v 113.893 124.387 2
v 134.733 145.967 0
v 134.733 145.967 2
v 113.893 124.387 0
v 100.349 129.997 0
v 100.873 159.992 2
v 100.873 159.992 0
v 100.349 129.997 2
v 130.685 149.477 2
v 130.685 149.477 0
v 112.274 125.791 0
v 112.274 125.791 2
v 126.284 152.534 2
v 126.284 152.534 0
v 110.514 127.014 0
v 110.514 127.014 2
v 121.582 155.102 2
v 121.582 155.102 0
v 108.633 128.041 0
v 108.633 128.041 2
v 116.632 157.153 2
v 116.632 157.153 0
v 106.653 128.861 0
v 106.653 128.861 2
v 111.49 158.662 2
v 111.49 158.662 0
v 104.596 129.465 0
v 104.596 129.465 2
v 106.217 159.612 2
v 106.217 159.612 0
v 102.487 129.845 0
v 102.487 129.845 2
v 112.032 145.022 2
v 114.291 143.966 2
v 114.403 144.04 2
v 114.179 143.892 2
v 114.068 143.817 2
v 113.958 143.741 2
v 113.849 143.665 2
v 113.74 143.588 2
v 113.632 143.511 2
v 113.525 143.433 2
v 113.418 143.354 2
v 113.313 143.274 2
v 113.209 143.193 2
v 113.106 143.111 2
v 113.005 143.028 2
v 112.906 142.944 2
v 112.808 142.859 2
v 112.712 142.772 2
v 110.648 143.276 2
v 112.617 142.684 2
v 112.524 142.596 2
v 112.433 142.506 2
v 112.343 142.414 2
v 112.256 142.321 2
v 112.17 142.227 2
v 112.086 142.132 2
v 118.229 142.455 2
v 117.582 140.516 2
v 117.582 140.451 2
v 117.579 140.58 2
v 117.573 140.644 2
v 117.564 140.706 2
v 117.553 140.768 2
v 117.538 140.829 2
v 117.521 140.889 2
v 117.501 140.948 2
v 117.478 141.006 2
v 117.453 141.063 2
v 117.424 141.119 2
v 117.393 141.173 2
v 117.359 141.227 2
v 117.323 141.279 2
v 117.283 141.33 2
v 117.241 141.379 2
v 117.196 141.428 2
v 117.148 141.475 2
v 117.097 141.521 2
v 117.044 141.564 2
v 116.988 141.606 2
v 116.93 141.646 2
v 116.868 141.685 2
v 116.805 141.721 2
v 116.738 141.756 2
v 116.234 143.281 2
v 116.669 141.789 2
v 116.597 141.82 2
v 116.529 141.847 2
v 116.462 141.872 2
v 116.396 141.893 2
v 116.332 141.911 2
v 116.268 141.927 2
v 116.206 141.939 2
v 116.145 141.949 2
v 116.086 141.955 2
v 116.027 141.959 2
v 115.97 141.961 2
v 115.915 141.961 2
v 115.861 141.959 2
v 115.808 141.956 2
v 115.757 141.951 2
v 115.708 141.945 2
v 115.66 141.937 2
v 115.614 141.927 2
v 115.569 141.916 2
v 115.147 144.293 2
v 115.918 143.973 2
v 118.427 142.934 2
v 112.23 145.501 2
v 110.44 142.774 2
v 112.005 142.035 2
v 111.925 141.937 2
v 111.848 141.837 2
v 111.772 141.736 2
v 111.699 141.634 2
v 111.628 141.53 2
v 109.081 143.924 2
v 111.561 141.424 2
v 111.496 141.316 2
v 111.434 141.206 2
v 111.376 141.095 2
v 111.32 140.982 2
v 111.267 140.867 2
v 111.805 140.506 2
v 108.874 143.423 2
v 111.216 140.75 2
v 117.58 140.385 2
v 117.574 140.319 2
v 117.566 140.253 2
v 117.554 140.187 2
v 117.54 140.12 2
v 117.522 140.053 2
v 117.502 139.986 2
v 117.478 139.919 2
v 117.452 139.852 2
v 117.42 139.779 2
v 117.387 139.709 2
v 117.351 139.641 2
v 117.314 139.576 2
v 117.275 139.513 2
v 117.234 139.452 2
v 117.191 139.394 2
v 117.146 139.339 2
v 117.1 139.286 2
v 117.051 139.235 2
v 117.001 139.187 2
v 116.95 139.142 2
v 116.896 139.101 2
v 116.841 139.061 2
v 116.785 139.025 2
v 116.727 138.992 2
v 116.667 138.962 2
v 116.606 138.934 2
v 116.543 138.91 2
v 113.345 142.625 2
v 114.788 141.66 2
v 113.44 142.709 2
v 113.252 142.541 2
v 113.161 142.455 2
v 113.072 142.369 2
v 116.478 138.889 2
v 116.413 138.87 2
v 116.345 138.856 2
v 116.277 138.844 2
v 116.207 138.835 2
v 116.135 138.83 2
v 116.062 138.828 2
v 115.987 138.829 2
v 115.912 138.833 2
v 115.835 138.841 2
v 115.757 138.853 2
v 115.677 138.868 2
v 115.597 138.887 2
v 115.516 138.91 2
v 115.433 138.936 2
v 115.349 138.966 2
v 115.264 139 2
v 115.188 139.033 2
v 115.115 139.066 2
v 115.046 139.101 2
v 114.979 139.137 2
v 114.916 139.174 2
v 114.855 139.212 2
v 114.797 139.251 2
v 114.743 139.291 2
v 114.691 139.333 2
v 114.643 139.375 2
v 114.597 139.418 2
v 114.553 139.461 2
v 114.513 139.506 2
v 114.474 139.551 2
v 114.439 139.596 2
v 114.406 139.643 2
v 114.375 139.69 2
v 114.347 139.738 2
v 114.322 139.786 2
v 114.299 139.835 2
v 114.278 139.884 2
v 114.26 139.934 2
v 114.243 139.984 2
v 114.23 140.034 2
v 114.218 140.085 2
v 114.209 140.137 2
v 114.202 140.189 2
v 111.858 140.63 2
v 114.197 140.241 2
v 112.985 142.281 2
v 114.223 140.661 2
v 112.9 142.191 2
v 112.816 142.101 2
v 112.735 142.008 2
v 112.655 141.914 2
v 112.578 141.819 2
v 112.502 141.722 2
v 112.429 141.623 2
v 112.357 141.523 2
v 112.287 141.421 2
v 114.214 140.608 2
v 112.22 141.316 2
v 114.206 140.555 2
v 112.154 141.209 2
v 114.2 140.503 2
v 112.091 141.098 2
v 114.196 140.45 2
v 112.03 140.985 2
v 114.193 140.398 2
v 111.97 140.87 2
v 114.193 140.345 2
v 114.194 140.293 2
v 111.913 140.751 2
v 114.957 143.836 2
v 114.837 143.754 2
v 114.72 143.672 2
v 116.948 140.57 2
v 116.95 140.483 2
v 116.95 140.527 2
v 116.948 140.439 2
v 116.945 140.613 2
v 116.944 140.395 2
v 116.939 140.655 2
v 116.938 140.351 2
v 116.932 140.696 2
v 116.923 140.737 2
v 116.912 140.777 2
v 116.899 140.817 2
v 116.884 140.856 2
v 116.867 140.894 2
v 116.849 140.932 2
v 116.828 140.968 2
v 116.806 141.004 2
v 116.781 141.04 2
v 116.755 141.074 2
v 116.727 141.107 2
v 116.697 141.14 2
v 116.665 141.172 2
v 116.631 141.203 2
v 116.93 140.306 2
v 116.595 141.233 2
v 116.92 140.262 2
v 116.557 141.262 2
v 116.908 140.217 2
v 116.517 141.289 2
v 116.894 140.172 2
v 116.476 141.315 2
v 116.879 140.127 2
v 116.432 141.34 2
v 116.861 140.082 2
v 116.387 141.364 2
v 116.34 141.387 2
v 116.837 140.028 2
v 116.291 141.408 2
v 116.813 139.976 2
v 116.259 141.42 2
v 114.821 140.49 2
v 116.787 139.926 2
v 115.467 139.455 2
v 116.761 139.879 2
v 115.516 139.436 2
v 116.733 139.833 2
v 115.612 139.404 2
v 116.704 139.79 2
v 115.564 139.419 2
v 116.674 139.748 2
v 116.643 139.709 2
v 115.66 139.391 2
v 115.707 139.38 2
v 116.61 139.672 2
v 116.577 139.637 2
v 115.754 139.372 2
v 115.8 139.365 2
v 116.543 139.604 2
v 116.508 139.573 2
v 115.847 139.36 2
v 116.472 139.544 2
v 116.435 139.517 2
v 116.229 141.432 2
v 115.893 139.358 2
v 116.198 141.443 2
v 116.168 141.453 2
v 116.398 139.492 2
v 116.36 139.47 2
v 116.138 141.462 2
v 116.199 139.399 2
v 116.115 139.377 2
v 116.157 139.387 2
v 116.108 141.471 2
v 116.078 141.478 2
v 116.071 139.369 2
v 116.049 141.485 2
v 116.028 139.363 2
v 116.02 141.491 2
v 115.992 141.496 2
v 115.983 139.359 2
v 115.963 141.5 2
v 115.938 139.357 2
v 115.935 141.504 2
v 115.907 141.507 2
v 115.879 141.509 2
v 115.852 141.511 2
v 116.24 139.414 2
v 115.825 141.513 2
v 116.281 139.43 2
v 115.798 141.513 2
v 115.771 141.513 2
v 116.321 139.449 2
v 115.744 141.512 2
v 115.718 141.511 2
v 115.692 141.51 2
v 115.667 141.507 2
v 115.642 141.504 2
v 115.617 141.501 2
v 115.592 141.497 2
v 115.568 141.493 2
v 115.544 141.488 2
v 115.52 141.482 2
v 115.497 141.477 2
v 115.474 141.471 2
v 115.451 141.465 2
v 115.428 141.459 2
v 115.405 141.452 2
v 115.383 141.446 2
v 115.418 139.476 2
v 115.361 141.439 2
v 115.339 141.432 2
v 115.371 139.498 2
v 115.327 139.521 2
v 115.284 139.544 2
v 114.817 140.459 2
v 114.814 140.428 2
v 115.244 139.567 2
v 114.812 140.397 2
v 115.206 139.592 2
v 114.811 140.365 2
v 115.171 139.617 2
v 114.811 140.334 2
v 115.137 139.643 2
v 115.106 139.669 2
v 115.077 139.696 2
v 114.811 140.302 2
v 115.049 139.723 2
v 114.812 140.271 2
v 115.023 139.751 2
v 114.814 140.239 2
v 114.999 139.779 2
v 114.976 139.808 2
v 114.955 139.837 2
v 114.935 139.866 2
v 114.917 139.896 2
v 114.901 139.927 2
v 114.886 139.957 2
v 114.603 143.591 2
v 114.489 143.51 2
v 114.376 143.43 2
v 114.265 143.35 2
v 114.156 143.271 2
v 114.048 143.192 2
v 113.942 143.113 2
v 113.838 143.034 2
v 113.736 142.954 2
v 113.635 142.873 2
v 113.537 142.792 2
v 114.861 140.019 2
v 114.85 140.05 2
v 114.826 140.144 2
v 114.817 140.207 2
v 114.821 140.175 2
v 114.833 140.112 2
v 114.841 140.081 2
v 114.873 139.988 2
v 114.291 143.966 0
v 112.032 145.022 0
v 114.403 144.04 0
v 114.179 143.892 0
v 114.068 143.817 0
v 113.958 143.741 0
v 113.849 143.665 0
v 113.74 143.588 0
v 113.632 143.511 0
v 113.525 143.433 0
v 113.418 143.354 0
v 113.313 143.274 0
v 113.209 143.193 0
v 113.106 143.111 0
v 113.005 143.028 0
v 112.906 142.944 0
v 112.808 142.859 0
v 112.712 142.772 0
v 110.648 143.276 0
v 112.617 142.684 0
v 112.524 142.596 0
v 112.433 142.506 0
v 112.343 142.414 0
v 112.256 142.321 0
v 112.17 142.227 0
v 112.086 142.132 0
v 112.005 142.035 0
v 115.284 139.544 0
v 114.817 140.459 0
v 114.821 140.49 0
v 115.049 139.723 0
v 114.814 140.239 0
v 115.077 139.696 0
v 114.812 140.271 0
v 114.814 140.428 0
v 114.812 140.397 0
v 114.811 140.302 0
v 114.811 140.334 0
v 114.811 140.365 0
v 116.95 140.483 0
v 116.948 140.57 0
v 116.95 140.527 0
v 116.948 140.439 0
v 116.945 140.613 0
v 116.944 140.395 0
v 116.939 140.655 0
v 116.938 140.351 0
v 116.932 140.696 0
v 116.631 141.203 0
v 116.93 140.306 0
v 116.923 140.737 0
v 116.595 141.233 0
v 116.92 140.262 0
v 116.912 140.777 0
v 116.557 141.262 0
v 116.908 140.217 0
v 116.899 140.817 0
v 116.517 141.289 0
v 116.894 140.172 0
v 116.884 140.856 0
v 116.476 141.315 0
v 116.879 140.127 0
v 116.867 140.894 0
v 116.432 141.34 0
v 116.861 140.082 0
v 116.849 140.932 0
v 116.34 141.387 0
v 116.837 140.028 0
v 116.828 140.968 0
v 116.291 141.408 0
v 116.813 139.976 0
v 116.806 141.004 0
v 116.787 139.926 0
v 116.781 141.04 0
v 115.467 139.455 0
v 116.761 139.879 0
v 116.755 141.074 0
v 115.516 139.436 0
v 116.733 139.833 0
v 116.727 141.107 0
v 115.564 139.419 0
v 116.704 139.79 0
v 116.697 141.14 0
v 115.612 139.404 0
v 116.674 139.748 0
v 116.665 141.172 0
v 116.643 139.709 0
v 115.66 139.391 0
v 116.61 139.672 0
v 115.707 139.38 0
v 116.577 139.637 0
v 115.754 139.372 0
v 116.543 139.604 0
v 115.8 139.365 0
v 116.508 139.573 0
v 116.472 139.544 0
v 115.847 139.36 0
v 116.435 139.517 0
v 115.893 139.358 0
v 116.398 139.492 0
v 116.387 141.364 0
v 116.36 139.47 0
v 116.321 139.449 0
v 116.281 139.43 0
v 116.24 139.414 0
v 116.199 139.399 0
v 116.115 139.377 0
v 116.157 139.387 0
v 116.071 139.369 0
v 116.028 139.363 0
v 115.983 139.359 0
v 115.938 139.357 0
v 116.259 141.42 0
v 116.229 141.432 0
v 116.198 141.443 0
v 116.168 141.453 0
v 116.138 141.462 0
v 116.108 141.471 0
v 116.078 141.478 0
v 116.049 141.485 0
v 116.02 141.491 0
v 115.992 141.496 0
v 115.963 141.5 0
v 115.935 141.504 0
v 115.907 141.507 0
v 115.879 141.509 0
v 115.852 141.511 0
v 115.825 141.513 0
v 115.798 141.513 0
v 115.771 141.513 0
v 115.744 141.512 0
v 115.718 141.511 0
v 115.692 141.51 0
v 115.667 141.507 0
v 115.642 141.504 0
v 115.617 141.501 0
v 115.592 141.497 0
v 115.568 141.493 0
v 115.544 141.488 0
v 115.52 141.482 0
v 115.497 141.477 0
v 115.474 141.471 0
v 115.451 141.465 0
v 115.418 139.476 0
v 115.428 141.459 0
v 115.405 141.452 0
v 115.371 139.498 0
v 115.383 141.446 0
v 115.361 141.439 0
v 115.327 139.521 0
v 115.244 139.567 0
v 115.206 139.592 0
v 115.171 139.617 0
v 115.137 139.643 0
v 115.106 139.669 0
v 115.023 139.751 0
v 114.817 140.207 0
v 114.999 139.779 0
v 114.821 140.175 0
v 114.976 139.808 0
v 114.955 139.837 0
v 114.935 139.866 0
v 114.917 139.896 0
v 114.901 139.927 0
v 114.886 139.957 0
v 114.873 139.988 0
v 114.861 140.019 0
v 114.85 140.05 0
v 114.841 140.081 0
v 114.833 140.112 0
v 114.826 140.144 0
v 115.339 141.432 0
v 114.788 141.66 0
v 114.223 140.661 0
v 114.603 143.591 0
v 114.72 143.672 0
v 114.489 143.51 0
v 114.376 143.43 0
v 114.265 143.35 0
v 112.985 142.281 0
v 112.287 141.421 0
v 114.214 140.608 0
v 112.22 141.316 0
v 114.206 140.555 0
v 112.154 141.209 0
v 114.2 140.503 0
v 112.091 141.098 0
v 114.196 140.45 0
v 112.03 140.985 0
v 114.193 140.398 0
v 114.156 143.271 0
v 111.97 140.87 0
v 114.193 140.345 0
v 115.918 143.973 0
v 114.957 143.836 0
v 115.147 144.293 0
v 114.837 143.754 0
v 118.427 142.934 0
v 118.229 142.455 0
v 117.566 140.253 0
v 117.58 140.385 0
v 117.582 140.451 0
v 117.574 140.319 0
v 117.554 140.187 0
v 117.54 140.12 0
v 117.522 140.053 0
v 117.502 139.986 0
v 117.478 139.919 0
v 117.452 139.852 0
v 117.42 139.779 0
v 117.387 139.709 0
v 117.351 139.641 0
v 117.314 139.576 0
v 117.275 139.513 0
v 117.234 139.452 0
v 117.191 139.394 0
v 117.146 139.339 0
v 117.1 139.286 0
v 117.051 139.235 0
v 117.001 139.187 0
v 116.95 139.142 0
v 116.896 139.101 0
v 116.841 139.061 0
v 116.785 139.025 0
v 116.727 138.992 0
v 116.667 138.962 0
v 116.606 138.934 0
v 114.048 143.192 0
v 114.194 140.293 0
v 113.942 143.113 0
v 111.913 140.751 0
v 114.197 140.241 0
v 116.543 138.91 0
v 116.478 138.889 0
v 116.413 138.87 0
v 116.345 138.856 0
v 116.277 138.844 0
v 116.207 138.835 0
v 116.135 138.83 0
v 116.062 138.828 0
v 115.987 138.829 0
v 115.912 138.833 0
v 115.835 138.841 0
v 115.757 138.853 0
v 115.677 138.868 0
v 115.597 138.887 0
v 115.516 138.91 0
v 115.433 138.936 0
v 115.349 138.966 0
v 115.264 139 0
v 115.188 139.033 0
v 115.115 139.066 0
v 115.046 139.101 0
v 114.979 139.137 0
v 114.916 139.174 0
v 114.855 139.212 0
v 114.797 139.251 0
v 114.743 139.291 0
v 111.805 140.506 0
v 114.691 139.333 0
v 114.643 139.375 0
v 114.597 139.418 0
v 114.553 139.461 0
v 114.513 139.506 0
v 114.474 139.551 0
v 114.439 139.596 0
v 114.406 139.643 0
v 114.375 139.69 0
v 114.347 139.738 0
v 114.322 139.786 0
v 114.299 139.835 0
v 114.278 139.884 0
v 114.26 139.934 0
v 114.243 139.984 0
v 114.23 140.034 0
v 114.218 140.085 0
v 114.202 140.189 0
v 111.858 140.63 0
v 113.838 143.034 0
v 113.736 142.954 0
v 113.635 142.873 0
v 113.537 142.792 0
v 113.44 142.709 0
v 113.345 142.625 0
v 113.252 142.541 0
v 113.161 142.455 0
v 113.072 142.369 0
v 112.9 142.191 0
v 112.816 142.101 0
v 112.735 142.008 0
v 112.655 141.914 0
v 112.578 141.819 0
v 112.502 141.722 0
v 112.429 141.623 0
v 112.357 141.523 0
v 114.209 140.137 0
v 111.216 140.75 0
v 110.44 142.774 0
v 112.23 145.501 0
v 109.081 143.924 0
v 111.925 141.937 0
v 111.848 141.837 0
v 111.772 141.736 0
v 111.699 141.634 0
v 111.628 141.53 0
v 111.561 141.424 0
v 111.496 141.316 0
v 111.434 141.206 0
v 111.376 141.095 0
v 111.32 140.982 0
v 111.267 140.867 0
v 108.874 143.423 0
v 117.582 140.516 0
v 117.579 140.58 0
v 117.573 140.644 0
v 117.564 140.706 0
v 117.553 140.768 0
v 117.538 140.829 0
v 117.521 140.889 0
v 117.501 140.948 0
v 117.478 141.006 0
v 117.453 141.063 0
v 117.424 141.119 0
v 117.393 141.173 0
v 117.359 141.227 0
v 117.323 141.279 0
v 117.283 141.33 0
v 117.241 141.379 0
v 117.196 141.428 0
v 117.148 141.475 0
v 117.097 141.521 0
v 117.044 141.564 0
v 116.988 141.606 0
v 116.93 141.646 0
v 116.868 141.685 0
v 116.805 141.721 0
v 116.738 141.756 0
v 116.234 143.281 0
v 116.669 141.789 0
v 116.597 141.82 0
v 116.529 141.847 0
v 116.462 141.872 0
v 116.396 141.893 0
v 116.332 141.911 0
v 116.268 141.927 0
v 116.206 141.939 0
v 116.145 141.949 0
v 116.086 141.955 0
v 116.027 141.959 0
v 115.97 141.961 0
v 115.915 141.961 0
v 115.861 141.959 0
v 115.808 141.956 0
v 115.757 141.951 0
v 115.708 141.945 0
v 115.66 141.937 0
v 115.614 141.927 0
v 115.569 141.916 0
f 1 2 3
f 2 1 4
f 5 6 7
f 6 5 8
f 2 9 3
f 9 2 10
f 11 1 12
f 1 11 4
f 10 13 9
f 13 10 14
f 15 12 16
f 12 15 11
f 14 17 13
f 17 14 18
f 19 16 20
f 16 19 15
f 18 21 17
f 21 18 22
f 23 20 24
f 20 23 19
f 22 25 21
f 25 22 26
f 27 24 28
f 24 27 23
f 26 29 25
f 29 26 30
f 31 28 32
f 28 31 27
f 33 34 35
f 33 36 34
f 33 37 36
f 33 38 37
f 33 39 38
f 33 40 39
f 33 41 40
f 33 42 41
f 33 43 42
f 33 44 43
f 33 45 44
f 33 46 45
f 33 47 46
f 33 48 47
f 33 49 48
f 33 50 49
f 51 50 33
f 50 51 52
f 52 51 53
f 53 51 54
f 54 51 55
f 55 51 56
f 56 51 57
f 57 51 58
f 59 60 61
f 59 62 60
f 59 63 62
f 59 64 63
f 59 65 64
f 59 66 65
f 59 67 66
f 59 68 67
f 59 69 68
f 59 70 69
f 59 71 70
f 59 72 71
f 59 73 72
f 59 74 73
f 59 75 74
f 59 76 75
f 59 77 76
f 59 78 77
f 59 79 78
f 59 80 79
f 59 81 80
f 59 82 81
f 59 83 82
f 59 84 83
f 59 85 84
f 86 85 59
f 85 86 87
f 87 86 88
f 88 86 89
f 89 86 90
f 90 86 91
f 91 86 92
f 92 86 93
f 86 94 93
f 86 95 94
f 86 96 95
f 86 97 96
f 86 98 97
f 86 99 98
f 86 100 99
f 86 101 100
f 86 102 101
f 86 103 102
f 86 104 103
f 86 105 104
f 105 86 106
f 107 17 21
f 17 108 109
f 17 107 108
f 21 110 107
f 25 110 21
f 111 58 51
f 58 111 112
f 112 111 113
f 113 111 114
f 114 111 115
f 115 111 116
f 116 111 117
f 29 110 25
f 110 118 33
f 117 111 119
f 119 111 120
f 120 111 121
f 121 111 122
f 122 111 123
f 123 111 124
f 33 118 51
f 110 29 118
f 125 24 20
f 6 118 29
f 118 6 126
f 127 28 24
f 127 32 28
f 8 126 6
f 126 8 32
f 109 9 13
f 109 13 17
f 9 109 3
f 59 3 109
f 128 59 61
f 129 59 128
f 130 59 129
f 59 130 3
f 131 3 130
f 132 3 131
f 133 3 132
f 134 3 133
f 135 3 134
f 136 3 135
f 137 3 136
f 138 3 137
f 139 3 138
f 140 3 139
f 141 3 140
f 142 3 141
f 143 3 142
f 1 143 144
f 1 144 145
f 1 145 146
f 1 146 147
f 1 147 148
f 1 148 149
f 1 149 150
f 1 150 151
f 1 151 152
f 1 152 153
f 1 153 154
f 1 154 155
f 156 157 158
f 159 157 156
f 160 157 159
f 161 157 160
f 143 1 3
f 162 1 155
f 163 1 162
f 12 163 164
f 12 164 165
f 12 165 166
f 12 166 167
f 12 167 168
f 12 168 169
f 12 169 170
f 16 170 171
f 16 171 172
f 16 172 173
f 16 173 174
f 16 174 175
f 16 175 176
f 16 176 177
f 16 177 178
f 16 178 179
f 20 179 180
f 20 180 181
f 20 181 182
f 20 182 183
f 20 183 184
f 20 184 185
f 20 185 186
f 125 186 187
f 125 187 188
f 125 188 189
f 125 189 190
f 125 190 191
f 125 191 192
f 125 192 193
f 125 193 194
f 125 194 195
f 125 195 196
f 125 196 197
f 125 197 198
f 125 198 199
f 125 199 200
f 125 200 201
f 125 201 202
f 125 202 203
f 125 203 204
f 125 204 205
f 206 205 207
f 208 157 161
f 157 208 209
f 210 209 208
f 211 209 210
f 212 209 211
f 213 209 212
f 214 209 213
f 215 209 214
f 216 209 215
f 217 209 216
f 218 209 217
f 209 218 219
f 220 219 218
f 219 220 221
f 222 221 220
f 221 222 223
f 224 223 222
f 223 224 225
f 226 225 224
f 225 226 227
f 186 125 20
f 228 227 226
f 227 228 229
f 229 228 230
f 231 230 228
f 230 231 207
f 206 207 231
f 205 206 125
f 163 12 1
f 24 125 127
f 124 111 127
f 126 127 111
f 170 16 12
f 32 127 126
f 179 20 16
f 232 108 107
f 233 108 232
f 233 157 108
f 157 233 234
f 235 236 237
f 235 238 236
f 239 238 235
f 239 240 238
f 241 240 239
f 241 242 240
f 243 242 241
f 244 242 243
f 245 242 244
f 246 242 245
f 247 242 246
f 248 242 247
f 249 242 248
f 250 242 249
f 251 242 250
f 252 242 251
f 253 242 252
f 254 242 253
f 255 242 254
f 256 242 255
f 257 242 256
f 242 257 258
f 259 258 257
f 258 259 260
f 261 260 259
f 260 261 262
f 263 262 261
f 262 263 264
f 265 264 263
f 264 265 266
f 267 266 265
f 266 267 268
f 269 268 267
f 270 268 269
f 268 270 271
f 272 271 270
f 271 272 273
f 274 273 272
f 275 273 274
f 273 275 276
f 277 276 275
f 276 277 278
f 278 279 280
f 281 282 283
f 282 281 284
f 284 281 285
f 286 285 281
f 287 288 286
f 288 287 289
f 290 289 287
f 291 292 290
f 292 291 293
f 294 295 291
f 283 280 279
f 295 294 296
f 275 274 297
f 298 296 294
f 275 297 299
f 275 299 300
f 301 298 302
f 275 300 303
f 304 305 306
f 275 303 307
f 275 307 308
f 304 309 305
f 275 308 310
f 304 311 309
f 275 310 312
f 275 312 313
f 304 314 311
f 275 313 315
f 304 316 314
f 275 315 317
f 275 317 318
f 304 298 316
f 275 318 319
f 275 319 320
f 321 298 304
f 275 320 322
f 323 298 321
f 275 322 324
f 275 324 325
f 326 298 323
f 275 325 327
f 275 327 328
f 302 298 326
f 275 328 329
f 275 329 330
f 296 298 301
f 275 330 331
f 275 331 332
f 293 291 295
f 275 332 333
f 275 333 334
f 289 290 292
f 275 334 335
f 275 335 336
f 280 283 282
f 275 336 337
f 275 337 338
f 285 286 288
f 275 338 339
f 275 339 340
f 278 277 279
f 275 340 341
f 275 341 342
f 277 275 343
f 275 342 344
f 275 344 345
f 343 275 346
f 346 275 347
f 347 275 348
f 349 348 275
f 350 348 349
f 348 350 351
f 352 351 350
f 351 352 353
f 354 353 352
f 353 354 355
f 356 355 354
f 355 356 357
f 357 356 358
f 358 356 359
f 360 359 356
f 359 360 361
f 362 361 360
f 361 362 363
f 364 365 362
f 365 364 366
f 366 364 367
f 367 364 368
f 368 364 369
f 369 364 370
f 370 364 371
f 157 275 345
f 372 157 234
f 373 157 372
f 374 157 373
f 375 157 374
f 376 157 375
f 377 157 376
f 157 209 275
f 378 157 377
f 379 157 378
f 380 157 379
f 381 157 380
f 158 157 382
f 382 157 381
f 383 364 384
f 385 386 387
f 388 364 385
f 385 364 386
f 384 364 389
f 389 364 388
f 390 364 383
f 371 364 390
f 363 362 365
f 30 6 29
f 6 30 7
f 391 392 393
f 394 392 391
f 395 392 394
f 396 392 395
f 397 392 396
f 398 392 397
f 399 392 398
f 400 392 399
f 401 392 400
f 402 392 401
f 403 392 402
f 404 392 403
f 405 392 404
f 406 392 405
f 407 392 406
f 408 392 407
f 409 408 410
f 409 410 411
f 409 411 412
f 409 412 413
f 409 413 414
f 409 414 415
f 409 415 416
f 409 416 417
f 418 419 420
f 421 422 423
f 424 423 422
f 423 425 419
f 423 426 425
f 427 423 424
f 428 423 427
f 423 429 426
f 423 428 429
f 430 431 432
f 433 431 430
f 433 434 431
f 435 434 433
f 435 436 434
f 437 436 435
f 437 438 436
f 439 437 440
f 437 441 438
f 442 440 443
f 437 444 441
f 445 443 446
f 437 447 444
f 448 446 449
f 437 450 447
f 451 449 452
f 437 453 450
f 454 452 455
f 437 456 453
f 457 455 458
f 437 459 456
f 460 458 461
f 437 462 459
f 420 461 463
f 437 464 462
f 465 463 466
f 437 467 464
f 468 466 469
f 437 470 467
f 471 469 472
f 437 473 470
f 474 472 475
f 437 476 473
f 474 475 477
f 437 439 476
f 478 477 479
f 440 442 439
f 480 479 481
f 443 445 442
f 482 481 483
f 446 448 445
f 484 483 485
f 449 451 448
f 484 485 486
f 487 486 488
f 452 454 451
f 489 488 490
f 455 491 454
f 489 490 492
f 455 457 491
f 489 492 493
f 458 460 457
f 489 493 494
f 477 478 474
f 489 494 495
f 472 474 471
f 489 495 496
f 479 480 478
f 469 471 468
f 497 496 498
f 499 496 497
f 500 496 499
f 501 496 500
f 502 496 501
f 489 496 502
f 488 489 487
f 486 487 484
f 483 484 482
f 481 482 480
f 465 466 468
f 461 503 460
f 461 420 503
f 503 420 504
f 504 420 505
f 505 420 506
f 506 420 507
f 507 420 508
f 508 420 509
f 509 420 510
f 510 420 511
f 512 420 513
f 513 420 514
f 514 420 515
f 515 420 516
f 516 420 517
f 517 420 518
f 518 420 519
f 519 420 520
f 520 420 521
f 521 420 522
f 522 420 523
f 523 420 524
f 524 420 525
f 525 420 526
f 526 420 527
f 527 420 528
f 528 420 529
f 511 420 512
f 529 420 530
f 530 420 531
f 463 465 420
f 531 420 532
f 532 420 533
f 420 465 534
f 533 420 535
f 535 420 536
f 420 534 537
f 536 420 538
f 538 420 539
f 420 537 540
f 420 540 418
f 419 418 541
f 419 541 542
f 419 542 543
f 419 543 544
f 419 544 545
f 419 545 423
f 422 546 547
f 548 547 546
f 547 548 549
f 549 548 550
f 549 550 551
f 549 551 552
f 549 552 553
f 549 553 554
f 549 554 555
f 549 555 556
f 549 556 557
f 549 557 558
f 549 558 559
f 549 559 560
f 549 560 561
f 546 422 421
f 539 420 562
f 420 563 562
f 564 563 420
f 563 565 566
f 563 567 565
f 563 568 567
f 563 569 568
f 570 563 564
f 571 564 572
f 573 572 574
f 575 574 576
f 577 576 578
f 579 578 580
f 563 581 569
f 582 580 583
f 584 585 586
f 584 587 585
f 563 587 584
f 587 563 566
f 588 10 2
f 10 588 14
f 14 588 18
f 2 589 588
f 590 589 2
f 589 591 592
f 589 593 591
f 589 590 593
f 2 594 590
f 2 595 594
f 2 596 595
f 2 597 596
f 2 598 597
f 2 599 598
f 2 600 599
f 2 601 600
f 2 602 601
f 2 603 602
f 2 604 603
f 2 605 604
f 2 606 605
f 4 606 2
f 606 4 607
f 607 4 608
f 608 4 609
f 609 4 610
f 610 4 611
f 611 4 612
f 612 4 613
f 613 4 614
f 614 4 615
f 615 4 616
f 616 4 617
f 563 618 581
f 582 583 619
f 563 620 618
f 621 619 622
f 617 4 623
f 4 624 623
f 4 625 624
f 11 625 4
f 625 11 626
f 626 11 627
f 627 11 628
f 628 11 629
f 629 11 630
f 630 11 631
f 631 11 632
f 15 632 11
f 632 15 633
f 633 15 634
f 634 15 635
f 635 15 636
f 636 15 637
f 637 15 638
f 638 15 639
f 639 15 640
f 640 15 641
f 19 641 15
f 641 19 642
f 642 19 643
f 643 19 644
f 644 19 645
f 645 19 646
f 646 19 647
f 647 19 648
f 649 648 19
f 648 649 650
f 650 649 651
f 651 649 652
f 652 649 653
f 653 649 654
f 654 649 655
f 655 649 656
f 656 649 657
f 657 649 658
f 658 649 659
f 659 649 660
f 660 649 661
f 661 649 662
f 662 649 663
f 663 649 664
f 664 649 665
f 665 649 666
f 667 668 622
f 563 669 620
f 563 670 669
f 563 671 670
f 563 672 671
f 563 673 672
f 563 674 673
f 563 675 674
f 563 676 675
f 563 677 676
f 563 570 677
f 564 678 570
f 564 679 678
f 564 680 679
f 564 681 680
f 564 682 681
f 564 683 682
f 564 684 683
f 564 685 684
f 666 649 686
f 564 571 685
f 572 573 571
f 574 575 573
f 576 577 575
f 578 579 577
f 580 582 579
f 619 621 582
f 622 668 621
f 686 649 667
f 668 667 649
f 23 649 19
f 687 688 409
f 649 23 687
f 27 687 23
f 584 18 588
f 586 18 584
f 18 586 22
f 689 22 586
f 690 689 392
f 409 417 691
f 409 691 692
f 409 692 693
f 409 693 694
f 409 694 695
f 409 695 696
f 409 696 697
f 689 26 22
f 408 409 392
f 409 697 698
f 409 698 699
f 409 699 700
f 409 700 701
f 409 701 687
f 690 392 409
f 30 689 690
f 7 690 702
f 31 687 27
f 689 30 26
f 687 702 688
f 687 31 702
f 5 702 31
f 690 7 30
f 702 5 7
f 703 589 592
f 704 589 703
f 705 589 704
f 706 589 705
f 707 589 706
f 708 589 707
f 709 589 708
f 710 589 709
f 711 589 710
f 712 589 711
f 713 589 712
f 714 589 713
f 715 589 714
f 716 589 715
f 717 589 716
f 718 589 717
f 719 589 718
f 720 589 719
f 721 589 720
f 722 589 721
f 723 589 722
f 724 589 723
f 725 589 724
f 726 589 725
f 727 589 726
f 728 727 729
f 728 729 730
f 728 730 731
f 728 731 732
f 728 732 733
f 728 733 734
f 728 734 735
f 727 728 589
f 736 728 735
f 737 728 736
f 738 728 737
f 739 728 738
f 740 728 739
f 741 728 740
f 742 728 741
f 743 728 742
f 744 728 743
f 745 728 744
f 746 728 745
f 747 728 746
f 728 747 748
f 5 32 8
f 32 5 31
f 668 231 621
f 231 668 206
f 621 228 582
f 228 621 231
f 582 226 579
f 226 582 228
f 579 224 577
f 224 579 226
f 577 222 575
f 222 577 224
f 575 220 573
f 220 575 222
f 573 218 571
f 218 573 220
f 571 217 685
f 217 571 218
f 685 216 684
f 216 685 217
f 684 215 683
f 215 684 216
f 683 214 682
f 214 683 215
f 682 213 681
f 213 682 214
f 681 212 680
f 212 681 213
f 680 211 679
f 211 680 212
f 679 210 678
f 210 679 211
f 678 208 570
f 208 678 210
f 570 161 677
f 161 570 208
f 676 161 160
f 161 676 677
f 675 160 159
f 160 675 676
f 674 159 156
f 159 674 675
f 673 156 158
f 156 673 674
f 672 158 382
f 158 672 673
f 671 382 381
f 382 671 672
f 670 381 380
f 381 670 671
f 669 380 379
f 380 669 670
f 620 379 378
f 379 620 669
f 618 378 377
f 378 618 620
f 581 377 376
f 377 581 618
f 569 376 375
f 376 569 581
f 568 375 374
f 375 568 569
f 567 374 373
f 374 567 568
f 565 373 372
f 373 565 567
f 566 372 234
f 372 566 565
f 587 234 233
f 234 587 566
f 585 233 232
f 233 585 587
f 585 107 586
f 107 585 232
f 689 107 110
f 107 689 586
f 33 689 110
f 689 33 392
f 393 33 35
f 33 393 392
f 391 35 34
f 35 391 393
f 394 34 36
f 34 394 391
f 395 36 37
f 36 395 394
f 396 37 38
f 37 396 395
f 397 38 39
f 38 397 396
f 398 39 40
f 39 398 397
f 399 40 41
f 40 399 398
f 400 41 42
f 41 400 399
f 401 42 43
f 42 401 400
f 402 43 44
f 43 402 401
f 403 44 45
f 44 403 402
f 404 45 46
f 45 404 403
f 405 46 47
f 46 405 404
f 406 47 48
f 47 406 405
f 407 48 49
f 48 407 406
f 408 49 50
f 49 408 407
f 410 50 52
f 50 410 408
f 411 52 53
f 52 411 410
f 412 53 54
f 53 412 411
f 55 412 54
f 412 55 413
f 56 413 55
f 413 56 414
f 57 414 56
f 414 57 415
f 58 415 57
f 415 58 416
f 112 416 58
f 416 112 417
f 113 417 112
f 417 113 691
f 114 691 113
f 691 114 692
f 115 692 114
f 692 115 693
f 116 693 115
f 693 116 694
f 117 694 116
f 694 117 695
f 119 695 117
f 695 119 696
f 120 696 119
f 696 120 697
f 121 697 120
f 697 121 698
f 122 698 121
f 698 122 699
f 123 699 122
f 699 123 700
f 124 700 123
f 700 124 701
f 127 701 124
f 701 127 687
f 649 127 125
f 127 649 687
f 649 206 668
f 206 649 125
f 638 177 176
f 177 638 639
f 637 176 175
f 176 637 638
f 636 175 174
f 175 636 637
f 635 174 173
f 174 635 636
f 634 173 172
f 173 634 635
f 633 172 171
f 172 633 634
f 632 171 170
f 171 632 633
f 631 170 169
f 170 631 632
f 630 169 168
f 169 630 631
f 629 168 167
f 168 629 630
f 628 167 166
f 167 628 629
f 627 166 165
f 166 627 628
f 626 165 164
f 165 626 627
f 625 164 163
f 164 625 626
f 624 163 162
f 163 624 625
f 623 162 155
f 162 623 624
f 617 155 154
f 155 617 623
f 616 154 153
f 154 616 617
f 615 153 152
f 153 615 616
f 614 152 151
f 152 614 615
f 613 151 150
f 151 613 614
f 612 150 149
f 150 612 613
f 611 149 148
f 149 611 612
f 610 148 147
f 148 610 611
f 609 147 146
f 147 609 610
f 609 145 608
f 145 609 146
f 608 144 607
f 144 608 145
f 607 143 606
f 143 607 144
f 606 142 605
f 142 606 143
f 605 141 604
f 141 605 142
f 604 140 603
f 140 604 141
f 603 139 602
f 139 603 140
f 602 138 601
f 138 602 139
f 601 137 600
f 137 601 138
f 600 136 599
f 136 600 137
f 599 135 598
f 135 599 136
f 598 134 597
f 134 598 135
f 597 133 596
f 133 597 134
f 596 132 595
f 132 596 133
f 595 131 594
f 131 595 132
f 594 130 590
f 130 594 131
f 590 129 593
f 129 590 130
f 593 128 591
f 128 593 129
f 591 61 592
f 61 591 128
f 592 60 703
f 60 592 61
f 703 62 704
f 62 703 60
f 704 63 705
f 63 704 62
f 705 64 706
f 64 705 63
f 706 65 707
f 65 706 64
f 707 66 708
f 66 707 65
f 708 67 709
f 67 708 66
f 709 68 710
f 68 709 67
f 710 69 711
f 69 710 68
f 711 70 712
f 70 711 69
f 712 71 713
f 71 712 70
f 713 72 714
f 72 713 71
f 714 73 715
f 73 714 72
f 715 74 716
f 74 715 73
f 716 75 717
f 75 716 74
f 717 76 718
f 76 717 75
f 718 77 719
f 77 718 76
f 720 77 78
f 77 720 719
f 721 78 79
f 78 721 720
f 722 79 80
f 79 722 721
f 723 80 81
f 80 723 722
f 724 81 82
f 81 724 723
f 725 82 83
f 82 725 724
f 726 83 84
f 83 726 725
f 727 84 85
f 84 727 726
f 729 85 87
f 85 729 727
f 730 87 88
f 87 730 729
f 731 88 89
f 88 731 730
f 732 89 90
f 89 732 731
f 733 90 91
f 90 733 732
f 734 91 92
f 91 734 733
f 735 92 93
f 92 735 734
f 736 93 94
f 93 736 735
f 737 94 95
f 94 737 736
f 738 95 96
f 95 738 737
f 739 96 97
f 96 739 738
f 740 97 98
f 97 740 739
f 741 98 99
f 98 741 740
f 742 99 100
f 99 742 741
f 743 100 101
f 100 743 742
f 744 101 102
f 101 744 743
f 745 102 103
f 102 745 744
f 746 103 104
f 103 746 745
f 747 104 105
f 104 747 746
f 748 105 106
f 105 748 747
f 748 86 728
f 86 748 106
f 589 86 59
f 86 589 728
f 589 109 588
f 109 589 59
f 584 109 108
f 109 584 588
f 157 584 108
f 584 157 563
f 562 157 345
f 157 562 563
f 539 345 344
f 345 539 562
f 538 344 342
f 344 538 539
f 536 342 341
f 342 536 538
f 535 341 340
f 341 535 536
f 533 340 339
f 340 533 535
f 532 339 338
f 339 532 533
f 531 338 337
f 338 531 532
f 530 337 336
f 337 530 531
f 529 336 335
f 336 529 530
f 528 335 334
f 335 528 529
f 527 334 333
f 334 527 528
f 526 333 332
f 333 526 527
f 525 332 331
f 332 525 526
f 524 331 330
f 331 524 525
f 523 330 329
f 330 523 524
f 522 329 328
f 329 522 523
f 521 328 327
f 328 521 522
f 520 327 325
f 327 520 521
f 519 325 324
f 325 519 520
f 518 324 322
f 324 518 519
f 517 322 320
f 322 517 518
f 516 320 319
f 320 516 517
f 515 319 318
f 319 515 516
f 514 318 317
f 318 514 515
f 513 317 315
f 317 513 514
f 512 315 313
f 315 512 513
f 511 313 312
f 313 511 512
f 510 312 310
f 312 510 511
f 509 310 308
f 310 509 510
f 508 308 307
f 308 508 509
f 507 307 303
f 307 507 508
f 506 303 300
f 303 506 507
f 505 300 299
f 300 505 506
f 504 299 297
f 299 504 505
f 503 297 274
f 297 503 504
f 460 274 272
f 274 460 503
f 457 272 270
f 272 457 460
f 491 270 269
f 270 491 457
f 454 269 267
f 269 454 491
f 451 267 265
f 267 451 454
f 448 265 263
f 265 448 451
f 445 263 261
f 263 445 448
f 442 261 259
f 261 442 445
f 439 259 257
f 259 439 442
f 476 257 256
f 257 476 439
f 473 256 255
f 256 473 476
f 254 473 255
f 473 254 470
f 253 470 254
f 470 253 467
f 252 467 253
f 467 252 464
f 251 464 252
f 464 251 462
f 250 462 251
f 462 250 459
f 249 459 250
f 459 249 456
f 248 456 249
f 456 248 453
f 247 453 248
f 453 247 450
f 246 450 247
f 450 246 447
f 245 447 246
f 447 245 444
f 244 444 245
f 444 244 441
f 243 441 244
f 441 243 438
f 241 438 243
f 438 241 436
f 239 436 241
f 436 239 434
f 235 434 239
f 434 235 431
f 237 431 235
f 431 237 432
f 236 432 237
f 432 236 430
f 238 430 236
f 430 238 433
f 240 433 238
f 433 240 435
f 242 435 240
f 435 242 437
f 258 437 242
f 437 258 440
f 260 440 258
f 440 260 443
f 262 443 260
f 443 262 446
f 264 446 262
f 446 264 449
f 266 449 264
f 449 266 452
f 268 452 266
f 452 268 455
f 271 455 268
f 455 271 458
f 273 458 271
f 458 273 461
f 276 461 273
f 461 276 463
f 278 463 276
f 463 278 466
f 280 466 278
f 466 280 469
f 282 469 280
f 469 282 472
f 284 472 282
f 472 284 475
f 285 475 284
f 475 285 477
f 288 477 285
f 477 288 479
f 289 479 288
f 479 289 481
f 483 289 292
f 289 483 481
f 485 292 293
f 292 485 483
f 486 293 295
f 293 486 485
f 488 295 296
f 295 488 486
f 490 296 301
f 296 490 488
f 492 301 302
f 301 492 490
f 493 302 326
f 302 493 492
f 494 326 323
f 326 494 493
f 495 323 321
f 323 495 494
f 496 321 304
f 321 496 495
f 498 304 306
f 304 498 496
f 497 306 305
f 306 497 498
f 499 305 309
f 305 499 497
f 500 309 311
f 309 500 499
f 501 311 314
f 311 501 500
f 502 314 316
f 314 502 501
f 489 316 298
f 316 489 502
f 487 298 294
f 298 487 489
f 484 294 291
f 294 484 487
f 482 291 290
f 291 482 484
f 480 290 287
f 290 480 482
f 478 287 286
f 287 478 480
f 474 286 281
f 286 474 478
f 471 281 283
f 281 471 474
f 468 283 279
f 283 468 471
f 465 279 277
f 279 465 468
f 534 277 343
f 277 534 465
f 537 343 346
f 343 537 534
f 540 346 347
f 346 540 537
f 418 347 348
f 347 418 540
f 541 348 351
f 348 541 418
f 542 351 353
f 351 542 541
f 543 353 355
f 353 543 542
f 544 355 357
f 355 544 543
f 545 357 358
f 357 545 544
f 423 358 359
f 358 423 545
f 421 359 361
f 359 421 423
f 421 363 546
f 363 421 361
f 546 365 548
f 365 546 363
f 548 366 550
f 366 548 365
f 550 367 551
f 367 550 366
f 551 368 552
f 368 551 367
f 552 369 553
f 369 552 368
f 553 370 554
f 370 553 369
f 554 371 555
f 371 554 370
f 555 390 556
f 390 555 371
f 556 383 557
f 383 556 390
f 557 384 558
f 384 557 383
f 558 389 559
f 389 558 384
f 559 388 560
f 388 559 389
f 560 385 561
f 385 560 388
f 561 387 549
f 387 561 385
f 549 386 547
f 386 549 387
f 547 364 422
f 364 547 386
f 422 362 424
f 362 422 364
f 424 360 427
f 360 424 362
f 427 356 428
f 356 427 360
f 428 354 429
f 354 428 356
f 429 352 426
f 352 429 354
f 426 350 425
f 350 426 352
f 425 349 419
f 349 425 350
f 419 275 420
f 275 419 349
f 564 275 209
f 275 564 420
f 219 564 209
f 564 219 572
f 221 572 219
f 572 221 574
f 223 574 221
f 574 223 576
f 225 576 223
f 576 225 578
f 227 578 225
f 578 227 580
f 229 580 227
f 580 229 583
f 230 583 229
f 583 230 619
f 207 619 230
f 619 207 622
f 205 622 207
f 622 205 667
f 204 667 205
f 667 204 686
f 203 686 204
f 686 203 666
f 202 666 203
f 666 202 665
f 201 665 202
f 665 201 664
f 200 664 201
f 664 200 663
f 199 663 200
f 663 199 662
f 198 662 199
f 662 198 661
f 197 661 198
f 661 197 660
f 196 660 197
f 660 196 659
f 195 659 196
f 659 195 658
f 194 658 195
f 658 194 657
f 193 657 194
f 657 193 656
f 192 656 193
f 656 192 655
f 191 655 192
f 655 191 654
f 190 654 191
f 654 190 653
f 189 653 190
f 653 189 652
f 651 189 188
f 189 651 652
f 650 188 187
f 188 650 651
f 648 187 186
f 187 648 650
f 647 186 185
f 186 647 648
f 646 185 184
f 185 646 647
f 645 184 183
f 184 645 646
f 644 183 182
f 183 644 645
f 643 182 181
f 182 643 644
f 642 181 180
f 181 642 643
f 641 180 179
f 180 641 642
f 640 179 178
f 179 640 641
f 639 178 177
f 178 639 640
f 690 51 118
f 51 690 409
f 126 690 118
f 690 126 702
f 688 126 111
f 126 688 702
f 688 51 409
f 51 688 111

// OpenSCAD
$fn = 64;
translate([100, 110, 0])
difference() {
    rotate([0, 0, 46])
        rotate_extrude(angle = 43)
            translate([20, 0]) square([30, 2]);
    
    translate([cos(67.5) * 35, sin(67.5) * 35, -0.1])
        rotate([0, 0, 67.5 - 90])
            linear_extrude(2.2)
                text("-75", size = 5, halign = "center", valign = "center");
}
